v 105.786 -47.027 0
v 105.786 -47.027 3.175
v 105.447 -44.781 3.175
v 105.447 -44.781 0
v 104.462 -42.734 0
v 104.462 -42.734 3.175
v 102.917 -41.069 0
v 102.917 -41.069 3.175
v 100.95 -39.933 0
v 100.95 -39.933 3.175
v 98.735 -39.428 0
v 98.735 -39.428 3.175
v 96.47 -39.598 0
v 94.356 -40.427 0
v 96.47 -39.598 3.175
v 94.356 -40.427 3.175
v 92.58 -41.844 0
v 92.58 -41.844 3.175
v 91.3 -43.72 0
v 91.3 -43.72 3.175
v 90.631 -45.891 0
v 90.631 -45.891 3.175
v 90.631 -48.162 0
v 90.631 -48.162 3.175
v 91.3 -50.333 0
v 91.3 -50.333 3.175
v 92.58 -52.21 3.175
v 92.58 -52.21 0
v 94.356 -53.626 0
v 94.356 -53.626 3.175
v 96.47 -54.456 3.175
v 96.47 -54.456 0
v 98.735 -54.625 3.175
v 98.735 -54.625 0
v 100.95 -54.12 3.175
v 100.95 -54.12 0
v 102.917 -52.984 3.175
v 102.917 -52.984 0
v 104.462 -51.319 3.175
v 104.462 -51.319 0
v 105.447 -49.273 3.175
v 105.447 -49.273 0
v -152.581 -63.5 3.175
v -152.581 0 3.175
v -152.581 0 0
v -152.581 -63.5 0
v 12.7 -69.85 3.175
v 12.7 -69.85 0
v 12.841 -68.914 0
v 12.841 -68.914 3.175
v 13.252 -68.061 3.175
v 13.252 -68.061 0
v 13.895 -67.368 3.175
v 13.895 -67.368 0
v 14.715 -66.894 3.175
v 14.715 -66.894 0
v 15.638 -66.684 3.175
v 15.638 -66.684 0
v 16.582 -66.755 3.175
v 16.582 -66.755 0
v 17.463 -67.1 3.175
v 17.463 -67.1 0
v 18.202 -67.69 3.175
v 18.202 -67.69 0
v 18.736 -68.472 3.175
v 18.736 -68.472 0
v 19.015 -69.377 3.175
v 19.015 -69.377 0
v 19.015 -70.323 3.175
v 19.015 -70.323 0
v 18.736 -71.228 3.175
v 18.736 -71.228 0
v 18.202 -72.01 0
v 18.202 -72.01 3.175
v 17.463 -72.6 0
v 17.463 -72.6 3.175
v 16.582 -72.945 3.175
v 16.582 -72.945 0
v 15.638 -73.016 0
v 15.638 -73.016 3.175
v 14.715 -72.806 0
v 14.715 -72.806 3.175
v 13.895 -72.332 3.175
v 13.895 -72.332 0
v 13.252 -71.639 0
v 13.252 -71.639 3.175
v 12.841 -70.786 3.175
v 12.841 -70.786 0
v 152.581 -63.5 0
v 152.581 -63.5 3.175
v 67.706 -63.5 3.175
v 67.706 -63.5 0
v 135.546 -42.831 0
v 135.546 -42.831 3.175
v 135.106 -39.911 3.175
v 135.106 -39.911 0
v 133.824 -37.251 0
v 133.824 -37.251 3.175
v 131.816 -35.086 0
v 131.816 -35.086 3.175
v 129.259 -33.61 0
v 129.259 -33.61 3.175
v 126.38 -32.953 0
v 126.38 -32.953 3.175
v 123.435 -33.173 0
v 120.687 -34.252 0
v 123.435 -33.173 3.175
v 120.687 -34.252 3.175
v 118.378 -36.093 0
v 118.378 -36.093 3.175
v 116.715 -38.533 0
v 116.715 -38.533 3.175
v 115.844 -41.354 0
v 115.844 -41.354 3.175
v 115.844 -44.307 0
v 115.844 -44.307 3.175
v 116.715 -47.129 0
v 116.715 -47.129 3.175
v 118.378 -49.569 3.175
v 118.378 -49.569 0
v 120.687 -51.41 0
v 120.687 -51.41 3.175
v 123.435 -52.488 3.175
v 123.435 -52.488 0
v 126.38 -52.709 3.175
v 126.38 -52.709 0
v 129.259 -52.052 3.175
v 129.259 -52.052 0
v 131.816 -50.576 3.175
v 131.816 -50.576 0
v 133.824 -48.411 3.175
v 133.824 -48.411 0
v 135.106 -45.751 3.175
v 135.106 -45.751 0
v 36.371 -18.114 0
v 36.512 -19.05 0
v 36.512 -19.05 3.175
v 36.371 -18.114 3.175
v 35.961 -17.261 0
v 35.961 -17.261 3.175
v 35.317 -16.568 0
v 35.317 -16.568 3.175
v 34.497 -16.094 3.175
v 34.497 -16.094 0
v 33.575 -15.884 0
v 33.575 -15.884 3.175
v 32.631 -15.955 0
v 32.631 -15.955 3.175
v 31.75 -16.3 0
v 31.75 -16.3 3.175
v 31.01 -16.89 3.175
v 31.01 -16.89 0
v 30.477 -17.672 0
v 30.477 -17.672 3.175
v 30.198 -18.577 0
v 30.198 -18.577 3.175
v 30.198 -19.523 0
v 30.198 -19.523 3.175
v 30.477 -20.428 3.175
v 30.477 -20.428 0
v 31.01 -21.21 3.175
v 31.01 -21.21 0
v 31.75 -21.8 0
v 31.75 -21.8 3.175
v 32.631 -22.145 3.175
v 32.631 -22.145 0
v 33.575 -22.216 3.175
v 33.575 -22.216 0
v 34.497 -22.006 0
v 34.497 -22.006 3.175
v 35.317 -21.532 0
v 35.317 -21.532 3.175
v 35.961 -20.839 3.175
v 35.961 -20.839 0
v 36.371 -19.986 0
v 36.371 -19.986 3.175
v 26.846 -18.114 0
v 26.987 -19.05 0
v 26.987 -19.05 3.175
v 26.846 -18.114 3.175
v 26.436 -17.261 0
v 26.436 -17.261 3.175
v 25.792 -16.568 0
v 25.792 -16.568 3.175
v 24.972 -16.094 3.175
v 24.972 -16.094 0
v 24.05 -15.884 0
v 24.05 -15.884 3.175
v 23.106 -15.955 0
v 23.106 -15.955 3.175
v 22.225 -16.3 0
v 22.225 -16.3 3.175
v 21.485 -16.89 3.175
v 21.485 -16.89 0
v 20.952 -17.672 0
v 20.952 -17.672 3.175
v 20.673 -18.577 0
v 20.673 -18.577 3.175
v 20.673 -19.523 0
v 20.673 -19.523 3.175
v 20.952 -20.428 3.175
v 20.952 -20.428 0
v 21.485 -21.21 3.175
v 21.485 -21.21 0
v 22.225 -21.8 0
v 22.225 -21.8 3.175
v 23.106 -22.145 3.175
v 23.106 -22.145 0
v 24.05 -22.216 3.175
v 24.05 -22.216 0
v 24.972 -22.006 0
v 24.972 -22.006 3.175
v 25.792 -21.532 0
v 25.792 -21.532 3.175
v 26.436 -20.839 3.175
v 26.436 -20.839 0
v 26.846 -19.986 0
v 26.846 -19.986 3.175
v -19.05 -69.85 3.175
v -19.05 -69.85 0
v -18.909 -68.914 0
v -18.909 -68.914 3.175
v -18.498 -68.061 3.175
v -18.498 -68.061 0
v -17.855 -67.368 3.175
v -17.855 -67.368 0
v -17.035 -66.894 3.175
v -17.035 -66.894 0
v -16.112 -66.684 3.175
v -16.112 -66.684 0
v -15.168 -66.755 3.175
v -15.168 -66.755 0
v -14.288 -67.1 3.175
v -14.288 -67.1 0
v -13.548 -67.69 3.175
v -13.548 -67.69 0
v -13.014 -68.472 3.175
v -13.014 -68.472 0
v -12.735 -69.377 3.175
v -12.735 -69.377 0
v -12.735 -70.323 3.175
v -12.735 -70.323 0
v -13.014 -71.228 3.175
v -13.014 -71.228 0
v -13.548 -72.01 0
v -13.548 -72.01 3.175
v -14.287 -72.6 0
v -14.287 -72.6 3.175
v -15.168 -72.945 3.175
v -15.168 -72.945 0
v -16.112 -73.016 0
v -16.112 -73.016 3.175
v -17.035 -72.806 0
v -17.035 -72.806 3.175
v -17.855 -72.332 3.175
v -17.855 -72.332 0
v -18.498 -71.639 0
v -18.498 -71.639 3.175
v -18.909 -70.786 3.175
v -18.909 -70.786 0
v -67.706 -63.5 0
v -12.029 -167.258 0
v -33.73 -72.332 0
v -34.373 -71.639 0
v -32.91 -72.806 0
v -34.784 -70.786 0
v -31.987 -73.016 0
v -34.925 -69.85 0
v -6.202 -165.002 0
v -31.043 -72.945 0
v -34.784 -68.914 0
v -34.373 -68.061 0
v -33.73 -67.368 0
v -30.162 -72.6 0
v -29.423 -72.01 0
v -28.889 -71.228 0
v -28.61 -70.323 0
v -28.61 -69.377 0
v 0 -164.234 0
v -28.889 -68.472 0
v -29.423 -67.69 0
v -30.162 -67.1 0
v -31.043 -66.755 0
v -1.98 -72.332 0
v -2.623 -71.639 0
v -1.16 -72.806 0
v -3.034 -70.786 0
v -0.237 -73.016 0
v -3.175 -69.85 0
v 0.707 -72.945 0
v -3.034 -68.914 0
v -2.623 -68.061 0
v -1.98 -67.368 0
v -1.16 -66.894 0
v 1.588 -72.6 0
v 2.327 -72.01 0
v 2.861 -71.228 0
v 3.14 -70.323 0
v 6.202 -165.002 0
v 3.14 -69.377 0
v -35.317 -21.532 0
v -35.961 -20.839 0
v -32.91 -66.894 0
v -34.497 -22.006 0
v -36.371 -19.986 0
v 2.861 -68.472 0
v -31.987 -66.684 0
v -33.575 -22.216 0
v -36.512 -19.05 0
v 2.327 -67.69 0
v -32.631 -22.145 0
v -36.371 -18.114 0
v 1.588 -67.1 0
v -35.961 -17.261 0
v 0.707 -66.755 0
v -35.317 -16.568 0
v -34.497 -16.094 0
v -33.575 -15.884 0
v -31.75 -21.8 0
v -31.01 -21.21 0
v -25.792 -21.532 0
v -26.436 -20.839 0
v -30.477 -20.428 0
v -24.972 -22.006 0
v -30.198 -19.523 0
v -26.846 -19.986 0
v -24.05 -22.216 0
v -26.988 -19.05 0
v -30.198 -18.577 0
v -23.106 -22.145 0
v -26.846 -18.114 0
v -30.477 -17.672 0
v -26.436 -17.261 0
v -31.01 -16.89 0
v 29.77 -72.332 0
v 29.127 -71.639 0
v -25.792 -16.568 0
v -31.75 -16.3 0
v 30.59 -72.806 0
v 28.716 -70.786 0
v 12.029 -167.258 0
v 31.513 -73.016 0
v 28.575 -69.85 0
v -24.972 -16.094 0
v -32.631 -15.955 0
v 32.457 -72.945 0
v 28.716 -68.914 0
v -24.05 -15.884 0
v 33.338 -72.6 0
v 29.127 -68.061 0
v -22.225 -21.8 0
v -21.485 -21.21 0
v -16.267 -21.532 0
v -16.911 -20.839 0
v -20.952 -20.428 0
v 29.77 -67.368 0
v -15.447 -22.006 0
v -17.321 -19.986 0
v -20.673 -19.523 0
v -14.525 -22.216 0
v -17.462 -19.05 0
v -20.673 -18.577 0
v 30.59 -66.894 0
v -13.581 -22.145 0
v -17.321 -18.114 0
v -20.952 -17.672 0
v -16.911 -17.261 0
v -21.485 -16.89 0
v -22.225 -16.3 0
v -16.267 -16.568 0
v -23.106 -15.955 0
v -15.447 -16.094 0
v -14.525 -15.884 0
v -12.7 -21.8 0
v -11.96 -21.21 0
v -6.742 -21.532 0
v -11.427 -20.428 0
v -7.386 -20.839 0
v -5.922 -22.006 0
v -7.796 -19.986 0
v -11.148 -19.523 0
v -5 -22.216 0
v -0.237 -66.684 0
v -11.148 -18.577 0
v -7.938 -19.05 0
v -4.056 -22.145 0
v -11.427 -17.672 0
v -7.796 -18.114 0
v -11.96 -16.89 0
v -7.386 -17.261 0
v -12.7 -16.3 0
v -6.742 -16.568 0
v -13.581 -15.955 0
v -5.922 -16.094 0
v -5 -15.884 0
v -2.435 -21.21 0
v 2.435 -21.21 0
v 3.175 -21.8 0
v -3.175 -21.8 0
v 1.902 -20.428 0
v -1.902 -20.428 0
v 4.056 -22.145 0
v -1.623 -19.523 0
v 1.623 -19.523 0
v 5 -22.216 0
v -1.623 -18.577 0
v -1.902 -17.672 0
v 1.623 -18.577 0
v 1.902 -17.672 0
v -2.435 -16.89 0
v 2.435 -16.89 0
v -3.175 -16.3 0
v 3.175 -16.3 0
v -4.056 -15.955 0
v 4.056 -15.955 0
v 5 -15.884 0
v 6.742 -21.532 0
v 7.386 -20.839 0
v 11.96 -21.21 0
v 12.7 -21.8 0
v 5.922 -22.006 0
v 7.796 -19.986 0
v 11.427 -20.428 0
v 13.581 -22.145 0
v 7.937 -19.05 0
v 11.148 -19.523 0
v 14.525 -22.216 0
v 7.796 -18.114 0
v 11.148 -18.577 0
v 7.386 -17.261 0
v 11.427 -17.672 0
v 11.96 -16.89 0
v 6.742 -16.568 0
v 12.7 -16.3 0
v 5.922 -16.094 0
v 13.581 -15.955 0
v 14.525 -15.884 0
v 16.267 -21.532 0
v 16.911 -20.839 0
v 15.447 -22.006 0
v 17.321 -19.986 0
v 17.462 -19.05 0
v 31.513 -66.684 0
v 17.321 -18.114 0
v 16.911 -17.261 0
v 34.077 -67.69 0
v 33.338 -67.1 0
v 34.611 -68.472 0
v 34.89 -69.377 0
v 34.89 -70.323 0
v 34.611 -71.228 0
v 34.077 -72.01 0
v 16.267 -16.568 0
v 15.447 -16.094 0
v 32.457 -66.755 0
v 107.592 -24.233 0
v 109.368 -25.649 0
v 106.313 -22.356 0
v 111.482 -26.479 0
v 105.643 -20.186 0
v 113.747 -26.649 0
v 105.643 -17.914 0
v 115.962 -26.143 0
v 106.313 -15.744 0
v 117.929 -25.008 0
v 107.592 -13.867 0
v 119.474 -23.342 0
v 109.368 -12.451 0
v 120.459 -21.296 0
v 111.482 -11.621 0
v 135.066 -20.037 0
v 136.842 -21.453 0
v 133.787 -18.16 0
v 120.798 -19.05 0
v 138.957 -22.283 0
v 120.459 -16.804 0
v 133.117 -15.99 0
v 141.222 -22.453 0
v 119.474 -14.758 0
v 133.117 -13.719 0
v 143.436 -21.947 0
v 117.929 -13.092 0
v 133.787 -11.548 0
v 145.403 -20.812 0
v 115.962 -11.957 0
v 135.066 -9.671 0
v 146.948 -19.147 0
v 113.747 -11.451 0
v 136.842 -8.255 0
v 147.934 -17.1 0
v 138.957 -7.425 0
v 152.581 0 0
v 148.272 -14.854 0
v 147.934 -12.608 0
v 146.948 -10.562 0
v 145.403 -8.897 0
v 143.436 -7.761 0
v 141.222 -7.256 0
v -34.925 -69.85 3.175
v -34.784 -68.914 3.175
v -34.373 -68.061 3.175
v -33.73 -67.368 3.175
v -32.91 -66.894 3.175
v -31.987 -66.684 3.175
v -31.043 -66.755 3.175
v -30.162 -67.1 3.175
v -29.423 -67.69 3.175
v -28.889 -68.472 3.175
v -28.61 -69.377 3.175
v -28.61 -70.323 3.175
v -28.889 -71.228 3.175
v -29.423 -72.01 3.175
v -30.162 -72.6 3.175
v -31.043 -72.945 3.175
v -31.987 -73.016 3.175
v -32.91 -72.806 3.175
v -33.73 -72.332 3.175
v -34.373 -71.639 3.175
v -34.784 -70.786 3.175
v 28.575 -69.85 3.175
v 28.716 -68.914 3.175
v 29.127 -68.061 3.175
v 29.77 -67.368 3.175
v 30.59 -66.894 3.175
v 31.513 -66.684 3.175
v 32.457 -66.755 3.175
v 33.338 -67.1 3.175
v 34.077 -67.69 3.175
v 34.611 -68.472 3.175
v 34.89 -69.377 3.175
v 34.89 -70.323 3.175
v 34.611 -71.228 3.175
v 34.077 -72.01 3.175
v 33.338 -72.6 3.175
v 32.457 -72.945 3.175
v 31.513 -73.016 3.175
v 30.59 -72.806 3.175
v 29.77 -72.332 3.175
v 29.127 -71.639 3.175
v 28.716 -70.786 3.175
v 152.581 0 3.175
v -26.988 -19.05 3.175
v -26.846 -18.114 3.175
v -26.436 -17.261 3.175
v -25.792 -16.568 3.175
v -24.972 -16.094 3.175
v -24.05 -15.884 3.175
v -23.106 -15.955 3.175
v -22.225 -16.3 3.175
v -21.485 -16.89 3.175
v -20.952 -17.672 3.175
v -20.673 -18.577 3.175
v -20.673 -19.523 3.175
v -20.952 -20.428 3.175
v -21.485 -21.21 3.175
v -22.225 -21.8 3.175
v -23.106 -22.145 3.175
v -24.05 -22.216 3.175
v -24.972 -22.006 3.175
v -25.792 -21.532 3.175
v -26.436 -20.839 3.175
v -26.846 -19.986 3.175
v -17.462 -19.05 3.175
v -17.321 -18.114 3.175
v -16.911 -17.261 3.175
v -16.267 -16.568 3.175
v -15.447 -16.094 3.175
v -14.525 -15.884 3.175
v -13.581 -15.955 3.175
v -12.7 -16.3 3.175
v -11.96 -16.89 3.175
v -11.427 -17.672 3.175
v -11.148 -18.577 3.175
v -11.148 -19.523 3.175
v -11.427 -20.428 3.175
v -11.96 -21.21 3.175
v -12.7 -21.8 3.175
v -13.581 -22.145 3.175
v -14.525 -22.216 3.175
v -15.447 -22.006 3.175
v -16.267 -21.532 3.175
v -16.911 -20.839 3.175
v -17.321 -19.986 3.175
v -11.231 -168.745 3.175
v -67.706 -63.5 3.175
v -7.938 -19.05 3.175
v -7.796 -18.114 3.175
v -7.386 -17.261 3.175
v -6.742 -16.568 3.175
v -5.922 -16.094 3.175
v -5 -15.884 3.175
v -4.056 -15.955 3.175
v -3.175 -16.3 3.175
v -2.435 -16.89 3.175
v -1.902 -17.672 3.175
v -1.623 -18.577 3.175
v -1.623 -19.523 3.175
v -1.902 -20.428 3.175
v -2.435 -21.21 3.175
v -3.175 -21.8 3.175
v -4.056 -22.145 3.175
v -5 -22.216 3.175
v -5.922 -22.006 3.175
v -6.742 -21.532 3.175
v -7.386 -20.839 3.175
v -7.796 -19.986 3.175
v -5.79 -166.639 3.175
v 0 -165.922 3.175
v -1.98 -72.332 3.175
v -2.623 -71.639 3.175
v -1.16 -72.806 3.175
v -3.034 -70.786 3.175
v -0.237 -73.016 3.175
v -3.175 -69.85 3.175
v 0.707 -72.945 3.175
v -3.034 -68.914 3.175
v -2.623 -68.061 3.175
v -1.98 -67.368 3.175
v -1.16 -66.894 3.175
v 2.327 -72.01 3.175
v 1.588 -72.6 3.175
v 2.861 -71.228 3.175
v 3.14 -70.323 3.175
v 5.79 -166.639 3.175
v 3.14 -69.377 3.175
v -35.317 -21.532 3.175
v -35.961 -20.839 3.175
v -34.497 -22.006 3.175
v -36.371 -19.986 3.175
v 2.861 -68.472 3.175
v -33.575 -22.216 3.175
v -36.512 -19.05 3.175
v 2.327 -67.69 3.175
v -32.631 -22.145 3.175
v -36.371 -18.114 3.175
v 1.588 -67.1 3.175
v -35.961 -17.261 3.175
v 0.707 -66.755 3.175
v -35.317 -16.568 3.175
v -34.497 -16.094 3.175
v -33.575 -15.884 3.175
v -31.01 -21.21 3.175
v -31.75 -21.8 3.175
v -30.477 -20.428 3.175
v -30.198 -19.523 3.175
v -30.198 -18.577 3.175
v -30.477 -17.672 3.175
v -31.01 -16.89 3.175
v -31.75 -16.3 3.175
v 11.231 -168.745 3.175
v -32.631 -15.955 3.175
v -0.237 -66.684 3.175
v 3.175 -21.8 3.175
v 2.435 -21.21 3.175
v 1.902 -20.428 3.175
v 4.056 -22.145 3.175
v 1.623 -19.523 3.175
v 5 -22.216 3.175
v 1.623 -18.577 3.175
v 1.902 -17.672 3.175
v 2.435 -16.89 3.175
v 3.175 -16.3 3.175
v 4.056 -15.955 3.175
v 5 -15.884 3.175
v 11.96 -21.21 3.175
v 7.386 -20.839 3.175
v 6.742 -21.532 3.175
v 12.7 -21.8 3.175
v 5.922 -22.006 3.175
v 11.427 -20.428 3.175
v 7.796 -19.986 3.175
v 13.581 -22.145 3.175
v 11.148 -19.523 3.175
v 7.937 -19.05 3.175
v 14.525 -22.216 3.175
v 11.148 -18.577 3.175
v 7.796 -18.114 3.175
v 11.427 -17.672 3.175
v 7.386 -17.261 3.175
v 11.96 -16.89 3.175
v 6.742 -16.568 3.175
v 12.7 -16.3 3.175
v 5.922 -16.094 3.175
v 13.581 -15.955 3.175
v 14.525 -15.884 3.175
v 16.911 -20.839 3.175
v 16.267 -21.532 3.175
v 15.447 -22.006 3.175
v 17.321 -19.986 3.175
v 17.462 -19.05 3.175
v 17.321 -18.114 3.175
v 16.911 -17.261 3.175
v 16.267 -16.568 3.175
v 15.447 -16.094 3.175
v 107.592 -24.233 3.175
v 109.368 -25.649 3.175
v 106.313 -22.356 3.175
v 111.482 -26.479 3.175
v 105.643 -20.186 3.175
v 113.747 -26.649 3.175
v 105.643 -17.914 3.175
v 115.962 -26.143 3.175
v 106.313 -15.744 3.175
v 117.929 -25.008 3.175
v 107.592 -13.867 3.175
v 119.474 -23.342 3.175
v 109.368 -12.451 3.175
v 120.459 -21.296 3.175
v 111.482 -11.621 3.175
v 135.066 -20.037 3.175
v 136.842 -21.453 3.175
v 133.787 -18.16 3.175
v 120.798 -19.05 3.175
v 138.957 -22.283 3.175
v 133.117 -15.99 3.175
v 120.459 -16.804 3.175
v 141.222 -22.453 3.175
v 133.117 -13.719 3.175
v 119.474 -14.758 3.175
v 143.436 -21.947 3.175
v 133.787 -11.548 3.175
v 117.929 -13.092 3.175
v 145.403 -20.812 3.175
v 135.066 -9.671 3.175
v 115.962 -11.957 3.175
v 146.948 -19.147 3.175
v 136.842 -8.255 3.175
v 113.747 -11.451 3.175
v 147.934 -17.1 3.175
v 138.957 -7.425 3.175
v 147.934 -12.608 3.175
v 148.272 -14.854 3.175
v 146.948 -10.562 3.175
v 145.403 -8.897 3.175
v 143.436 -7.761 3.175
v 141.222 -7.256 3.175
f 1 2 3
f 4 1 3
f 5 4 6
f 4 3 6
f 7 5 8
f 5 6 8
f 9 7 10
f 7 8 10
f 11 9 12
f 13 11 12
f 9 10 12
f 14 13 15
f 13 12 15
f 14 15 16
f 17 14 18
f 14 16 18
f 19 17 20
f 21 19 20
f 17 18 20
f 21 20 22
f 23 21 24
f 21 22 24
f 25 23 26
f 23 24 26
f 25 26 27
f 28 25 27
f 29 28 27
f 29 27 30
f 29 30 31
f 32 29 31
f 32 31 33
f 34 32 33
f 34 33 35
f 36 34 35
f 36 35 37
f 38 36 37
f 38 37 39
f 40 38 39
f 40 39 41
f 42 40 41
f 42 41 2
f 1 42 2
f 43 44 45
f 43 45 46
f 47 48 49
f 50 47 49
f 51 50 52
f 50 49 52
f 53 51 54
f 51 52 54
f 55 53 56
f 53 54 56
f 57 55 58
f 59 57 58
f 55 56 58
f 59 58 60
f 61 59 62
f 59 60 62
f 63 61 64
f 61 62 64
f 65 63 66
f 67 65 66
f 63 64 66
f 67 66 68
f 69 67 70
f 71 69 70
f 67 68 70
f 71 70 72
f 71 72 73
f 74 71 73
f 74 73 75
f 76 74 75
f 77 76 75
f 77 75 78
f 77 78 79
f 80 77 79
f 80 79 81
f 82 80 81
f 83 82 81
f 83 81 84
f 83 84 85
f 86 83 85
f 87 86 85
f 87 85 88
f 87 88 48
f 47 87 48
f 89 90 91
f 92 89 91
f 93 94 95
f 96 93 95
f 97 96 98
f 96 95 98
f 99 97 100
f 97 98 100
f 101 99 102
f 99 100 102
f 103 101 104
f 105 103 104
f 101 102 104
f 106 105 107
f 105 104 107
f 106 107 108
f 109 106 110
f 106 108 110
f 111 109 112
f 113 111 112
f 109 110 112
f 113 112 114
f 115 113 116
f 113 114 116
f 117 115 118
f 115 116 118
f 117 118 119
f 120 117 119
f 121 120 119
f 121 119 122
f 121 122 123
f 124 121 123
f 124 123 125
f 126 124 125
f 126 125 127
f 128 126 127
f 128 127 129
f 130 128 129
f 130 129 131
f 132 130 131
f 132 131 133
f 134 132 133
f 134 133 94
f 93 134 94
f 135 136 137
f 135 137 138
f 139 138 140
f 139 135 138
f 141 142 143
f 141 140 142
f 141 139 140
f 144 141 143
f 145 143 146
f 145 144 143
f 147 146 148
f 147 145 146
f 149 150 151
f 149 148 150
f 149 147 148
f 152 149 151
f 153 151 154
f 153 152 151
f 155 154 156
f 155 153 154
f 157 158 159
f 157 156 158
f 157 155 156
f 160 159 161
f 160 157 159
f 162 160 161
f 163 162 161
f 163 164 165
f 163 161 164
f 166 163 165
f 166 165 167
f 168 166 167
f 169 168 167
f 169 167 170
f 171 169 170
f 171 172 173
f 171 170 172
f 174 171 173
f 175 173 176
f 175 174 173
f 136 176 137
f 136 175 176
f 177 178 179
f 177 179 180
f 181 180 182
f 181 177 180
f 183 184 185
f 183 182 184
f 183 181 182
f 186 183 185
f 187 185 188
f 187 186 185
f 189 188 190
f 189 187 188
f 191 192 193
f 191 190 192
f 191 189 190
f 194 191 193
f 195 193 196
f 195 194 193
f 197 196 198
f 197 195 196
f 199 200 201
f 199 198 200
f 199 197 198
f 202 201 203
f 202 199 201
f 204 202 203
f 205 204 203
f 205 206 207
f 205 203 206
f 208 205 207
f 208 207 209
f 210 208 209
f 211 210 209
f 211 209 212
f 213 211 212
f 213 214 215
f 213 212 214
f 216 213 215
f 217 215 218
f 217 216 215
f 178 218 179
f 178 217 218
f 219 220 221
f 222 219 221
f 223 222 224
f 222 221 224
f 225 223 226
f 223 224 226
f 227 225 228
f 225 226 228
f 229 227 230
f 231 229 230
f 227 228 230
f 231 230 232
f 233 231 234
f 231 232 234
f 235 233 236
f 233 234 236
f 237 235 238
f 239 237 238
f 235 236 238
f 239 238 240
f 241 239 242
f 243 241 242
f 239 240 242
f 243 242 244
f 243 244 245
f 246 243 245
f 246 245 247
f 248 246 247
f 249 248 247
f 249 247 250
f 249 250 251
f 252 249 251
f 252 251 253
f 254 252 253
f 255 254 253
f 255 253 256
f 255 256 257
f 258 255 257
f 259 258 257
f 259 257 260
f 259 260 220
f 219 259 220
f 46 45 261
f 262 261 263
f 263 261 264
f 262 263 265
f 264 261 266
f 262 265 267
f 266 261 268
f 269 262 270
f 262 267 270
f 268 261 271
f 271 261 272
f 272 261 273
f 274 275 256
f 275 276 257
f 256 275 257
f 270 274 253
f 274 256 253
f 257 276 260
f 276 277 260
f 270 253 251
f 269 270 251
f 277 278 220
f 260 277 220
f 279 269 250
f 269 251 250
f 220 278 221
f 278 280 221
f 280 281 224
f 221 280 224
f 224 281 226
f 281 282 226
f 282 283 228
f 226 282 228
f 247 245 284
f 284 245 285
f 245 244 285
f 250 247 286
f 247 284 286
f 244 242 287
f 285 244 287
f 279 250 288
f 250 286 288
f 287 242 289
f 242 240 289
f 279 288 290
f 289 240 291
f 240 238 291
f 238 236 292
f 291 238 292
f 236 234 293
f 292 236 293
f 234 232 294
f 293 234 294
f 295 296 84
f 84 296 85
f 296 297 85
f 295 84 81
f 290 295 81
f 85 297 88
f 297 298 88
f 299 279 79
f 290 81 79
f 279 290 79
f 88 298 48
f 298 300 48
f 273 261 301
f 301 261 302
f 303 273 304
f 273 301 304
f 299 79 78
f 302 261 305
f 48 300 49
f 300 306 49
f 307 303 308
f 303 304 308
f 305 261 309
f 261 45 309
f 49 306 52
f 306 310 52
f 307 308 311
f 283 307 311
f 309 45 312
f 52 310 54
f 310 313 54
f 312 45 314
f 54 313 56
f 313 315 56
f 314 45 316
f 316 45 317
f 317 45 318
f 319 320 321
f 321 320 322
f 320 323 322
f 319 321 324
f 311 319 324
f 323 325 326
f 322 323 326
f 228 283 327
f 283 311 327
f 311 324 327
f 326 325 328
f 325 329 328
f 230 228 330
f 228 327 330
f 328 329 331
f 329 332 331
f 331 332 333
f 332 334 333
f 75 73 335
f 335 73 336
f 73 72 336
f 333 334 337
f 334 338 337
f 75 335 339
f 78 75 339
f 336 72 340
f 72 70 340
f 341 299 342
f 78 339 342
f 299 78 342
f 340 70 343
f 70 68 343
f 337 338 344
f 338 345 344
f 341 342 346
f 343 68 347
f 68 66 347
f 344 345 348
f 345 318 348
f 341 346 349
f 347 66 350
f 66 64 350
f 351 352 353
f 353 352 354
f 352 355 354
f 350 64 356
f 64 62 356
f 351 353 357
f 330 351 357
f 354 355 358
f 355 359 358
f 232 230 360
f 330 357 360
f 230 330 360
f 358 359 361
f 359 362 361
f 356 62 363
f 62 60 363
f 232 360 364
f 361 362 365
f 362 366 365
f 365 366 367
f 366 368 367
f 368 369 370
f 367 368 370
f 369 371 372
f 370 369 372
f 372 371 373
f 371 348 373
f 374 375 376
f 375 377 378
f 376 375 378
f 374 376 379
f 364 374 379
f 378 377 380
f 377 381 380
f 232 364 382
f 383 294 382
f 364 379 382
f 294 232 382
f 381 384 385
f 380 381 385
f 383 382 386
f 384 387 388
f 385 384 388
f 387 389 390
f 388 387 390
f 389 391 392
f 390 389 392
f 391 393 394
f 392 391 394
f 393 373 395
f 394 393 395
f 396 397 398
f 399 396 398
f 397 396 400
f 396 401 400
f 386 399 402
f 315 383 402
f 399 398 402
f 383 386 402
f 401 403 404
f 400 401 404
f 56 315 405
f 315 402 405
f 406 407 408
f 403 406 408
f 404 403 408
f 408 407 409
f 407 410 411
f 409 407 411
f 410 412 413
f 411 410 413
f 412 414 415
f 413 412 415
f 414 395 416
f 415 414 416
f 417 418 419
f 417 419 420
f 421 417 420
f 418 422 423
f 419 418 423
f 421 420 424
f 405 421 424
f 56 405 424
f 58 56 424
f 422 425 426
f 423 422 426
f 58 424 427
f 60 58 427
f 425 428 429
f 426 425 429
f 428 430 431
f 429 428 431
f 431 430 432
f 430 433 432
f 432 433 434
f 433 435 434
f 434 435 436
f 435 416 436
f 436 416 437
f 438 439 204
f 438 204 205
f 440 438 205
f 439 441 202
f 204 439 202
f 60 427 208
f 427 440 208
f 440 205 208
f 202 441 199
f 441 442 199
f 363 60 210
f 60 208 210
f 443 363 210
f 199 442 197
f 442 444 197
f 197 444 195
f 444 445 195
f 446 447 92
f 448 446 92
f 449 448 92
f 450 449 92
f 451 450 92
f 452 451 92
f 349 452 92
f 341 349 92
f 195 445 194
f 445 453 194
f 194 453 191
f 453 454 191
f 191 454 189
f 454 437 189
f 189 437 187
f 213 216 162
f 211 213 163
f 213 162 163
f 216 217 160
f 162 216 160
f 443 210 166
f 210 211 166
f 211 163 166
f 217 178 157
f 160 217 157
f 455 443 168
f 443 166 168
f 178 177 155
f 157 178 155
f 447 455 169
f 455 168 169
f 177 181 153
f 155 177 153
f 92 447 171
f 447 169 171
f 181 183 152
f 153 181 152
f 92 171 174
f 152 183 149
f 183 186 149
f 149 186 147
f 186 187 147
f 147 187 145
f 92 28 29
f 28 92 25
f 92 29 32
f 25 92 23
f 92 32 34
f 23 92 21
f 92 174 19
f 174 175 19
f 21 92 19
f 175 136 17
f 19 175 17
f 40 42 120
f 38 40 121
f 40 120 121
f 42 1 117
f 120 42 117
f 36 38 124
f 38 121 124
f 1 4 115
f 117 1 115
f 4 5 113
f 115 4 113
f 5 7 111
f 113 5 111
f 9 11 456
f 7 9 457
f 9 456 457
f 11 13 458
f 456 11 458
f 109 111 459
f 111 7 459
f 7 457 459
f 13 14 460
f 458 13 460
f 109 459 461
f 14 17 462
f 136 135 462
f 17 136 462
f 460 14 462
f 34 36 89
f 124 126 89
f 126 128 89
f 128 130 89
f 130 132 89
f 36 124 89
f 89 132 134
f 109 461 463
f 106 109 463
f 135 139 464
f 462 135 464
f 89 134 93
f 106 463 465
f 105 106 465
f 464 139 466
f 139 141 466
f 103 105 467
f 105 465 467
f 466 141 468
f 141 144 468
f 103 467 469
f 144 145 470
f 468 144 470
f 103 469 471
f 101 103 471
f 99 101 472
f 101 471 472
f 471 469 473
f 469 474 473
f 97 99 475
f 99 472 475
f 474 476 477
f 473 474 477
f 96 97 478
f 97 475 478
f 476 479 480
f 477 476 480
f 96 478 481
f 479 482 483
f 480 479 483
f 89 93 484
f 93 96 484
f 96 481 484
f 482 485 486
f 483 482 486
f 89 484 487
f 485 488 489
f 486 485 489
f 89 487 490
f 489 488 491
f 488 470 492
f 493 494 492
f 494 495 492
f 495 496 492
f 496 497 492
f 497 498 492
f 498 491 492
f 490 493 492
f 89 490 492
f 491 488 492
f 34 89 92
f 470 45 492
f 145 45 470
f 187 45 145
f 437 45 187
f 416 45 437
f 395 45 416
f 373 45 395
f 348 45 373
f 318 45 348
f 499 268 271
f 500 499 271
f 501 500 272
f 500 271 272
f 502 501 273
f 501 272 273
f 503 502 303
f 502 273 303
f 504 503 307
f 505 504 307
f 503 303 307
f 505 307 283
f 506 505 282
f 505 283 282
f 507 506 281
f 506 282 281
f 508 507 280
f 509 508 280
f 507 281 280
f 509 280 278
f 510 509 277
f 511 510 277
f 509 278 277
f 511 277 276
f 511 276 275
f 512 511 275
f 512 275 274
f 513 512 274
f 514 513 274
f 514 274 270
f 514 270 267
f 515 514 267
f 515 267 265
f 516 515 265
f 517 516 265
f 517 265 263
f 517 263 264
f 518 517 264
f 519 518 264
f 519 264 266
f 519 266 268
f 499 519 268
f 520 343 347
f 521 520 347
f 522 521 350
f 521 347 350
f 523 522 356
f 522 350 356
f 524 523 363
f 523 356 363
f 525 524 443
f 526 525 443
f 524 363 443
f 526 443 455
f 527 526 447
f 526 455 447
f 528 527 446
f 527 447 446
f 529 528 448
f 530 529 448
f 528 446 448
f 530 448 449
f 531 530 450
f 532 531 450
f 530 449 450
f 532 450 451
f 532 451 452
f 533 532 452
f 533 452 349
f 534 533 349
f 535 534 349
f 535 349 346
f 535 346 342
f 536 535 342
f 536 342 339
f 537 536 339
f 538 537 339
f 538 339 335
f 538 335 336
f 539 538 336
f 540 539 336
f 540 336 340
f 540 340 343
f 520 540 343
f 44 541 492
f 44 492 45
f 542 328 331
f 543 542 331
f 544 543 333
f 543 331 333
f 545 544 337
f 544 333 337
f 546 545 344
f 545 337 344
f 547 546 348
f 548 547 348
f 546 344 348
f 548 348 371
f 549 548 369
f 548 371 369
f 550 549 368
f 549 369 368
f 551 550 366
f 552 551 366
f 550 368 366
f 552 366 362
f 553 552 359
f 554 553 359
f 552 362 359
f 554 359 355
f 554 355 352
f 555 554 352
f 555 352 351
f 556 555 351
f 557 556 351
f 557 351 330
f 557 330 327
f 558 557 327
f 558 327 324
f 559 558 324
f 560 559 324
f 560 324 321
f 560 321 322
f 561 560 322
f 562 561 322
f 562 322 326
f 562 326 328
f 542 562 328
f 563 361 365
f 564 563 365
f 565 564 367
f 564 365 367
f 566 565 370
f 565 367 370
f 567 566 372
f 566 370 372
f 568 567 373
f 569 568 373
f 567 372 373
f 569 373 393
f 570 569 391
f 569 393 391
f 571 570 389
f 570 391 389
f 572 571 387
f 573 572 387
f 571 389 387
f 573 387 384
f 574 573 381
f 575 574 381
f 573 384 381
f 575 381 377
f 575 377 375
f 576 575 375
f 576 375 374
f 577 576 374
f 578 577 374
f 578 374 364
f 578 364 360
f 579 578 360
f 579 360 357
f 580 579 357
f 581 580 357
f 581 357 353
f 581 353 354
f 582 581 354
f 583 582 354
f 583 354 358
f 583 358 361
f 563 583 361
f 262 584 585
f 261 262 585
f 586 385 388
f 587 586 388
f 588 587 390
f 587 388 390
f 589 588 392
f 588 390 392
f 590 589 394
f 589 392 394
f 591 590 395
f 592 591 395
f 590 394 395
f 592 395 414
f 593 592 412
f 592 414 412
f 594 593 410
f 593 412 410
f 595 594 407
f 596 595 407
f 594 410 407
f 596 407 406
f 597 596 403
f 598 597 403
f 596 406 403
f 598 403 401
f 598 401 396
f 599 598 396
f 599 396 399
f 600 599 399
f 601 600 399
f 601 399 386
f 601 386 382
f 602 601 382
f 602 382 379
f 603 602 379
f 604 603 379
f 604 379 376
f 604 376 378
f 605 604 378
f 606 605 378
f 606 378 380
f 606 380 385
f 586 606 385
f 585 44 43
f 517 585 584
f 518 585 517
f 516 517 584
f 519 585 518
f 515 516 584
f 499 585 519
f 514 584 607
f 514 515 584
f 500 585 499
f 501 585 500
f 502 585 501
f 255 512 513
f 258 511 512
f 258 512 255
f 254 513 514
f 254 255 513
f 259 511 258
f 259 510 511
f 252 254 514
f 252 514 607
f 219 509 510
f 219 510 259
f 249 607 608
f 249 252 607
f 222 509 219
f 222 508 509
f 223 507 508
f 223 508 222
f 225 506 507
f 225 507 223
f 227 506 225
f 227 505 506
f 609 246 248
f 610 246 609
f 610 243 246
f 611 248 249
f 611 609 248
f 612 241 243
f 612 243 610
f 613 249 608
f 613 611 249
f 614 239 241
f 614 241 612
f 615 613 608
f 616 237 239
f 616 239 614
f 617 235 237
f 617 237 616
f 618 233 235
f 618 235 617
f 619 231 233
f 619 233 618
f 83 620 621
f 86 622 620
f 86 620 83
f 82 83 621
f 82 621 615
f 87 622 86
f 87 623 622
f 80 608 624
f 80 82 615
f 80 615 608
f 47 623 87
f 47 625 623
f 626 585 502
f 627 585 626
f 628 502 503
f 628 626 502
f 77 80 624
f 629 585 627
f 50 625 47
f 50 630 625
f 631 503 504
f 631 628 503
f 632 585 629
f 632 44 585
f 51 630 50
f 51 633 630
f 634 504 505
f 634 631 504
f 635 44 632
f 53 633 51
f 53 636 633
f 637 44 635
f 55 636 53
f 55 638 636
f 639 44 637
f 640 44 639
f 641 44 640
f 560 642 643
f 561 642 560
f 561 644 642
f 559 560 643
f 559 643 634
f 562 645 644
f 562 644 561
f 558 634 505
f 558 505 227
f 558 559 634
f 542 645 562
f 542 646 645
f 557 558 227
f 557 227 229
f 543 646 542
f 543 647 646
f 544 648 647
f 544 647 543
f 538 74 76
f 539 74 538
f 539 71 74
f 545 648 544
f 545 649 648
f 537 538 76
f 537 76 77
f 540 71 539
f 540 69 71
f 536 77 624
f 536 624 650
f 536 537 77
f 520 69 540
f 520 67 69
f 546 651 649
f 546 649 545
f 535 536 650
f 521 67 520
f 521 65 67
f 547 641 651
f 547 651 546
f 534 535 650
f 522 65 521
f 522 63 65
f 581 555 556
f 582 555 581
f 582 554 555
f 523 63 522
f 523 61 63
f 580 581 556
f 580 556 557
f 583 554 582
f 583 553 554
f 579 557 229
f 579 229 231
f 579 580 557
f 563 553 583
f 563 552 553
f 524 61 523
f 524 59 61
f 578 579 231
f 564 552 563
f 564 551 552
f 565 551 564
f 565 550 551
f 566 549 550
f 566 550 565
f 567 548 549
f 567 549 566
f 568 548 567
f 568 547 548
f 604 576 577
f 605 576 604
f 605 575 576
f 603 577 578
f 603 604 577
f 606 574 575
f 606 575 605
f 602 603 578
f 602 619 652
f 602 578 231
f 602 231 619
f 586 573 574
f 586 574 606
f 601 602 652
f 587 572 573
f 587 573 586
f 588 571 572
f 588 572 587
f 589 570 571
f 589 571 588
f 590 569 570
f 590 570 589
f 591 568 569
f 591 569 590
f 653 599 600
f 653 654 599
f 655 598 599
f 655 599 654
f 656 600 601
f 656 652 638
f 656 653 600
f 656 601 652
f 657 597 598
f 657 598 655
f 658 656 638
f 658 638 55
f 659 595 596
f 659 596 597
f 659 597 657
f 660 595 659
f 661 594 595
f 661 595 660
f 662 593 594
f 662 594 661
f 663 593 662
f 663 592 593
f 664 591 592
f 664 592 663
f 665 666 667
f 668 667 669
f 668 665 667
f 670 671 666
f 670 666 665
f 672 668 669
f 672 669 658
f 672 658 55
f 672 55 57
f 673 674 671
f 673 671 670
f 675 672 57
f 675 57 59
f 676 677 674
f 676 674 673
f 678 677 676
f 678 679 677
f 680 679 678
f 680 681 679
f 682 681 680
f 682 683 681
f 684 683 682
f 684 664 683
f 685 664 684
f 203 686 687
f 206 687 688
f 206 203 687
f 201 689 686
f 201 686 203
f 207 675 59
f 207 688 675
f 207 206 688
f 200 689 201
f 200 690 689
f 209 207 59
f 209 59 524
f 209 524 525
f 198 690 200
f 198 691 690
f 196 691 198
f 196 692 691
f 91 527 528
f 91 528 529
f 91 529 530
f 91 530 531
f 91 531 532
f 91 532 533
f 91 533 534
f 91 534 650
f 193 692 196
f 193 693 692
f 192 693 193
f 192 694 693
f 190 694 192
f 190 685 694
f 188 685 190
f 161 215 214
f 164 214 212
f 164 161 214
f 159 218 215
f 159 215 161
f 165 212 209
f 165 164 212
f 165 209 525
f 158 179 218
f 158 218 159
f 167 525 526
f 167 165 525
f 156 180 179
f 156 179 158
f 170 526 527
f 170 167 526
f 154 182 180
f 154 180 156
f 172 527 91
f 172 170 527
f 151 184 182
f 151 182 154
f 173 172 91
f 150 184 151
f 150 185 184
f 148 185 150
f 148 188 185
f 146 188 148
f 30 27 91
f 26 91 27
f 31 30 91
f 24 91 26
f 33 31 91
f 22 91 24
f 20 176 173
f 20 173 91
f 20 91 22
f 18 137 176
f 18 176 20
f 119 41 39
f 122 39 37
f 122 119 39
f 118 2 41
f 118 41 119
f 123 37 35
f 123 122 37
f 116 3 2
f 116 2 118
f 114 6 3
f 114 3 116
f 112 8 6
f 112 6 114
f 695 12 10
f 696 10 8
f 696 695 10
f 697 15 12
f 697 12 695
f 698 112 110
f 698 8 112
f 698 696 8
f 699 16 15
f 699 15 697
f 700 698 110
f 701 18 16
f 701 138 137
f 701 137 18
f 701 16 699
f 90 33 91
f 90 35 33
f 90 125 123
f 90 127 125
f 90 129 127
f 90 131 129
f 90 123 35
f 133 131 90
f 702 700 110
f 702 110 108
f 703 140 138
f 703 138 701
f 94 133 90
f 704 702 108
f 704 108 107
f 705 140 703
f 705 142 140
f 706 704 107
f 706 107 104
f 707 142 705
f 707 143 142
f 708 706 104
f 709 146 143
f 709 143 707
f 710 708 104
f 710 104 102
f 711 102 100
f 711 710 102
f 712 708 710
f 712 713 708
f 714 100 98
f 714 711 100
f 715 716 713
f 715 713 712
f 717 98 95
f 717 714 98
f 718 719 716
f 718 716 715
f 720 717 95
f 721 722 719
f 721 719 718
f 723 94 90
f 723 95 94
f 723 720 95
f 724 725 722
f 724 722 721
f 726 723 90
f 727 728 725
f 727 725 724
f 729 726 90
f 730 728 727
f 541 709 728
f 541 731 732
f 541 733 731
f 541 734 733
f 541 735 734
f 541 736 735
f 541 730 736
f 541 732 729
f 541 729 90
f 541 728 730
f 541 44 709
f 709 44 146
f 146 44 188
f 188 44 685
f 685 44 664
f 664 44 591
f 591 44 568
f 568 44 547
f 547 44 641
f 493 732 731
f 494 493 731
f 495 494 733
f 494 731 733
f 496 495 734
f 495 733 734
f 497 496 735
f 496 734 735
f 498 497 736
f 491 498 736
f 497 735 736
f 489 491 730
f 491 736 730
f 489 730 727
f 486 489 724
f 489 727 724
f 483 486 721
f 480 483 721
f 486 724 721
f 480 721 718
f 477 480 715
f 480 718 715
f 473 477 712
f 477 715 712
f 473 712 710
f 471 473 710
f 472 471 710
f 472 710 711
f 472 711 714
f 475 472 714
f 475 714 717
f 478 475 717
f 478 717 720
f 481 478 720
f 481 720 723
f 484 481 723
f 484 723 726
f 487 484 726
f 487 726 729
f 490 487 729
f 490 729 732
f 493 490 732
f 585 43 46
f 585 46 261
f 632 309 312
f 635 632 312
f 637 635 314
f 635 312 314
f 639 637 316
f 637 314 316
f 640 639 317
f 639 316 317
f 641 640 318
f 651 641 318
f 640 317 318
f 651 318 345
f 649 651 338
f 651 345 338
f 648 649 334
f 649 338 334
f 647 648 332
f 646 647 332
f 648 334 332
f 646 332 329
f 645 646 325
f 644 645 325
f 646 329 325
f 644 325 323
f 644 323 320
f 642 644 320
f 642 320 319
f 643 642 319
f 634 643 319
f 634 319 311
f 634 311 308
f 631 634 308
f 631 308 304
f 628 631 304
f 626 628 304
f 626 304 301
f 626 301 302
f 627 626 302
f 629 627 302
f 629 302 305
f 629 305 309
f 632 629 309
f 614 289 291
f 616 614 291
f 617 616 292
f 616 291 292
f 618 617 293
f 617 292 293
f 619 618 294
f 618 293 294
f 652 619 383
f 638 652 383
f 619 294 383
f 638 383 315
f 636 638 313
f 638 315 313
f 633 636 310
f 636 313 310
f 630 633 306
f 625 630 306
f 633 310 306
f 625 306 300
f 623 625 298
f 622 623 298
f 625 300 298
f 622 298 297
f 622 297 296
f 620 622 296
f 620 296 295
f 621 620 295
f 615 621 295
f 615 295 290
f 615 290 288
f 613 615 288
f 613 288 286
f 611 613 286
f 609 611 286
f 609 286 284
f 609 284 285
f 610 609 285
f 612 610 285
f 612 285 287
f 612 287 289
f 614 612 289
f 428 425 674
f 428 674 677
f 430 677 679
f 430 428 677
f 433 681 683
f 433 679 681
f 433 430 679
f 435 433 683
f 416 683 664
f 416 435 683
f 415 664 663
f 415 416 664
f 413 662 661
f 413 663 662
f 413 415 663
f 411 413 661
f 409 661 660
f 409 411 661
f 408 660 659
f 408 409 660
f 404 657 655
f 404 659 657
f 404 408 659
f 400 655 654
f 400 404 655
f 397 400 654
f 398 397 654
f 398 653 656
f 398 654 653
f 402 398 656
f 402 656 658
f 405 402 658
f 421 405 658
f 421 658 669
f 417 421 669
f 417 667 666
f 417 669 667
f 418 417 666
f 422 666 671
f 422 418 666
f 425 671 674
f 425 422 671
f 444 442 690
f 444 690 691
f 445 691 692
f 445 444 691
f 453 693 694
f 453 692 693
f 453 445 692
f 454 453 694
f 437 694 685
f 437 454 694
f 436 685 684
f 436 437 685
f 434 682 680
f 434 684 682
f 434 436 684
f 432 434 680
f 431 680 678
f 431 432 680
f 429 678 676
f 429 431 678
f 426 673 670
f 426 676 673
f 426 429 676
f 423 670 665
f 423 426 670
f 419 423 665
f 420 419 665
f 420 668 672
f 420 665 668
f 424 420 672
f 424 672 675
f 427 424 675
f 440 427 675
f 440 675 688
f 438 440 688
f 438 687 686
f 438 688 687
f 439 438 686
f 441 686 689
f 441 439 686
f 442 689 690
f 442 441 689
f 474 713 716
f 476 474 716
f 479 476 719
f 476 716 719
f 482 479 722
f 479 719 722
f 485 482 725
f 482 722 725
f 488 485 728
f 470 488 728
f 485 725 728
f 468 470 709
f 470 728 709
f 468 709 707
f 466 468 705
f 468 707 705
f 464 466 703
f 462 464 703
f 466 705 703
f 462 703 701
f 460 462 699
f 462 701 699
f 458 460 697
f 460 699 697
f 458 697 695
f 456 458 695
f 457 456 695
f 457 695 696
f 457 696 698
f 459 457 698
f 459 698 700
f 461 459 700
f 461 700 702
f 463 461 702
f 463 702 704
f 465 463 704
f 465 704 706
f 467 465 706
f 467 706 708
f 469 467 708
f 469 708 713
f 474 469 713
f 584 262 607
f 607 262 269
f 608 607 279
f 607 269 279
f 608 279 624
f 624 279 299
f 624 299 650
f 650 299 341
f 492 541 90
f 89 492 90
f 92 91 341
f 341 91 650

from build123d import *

# Parameters (mm, degrees)
BOSS_EXTRUDE1_DEPTH         = 3.175
BOSS_EXTRUDE1_DRAFT         = -28
CUT_EXTRUDE3_DEPTH          = 4.175
BOSS_EXTRUDE2_DEPTH         = 3.175
F_1_4_0_25_DIAMETER_HOLE1_D = 6.35
SKETCH9_R                   = 9.906
SKETCH9_R_2                 = 7.62
CUT_EXTRUDE4_DEPTH          = 4.175
F_1_4_0_25_DIAMETER_HOLE2_D = 6.35


with BuildPart() as part:
    # Sketch1 → Boss-Extrude1 (with draft: the straight prism first)
    with BuildSketch(Plane.XY):
        with BuildLine():
            Line((-101.780957474, 0), (-12.02943471, -167.25772623))
            ThreePointArc((-12.02943471, -167.25772623), (0, -164.234100952), (12.02943471, -167.25772623))
            Line((12.02943471, -167.25772623), (101.780957474, 0))
            Line((101.780957474, 0), (-101.780957474, 0))
        make_face()
    extrude(amount=BOSS_EXTRUDE1_DEPTH)
    # Boss-Extrude1: the draft: its side faces are tilted about the plane it starts from
    boss_extrude1_sides = [part.faces().sort_by_distance(p)[0] for p in [
        (56.905196092, -83.628863115, 1.5875),
        (0, 0, 1.5875),
        (-56.905196092, -83.628863115, 1.5875),
        (0, -164.234100952, 1.5875),
    ]]
    draft(boss_extrude1_sides, Plane.XY, BOSS_EXTRUDE1_DRAFT)

    # Sketch6 → Cut-Extrude3 (cut, through all)
    with BuildSketch(Plane.XY.offset(3.175)):
        Polygon((-103.696831485, 0), (-101.780957474, 0), (101.780957474, 0), (103.696831485, 0), (104.602717866, 1.688177446), (-104.602717866, 1.688177446), align=None)
        with BuildLine():
            Line((-11.231210531, -168.745268245), (-101.780957474, 0))
            Line((-101.780957474, 0), (-103.696831485, 0))
            Line((-103.696831485, 0), (-12.690350956, -169.596420612))
            ThreePointArc((-12.690350956, -169.596420612), (-11.968349556, -169.157869126), (-11.231210531, -168.745268245))
        make_face()
        with BuildLine():
            Line((103.696831485, 0), (101.780957474, 0))
            Line((101.780957474, 0), (11.231210531, -168.745268245))
            ThreePointArc((11.231210531, -168.745268245), (11.968349556, -169.157869126), (12.690350956, -169.596420612))
            Line((12.690350956, -169.596420612), (103.696831485, 0))
        make_face()
    extrude(amount=-CUT_EXTRUDE3_DEPTH, mode=Mode.SUBTRACT)

    # Sketch8 → Boss-Extrude2 (add)
    with BuildSketch(Plane.XY.offset(3.175)):
        Polygon((-101.780957474, 0), (-152.580957474, 0), (-152.580957474, -63.5), (-67.706467619, -63.5), align=None)
        Polygon((152.580957474, -63.5), (67.706467619, -63.5), (101.780957474, 0), (152.580957474, 0), align=None)
    extrude(amount=-BOSS_EXTRUDE2_DEPTH)

    # 1/4 (0.25) Diameter Hole1 (through all)
    with Locations(Plane.XY.offset(3.175)):
        with Locations((-33.3375, -19.05), (-23.8125, -19.05), (-14.2875, -19.05), (-4.7625, -19.05)):
            f_1_4_0_25_diameter_hole1 = Hole(F_1_4_0_25_DIAMETER_HOLE1_D / 2)

    # Mirror1: 1/4 (0.25) Diameter Hole1 across plane
    add(f_1_4_0_25_diameter_hole1.mirror(Plane(origin=(0, 0, 0), x_dir=(0, 0, 1), z_dir=(1, 0, 0))), mode=Mode.SUBTRACT)

    # Sketch9 → Cut-Extrude4 (cut, through all)
    with BuildSketch(Plane.XY.offset(3.175)):
        with Locations((125.639722953, -42.830834866)):
            Circle(SKETCH9_R)
        with Locations((140.652136328, -14.854238493)):
            Circle(SKETCH9_R_2)
        with Locations((113.178020253, -19.05)):
            Circle(SKETCH9_R_2)
        with Locations((98.165606878, -47.026596374)):
            Circle(SKETCH9_R_2)
    extrude(amount=-CUT_EXTRUDE4_DEPTH, mode=Mode.SUBTRACT)

    # 1/4 (0.25) Diameter Hole2 (through all)
    with Locations(Plane.XY.offset(3.175)):
        with Locations((-31.75, -69.85), (-15.875, -69.85), (0, -69.85), (15.875, -69.85), (31.75, -69.85)):
            Hole(F_1_4_0_25_DIAMETER_HOLE2_D / 2)


solid = part.part
